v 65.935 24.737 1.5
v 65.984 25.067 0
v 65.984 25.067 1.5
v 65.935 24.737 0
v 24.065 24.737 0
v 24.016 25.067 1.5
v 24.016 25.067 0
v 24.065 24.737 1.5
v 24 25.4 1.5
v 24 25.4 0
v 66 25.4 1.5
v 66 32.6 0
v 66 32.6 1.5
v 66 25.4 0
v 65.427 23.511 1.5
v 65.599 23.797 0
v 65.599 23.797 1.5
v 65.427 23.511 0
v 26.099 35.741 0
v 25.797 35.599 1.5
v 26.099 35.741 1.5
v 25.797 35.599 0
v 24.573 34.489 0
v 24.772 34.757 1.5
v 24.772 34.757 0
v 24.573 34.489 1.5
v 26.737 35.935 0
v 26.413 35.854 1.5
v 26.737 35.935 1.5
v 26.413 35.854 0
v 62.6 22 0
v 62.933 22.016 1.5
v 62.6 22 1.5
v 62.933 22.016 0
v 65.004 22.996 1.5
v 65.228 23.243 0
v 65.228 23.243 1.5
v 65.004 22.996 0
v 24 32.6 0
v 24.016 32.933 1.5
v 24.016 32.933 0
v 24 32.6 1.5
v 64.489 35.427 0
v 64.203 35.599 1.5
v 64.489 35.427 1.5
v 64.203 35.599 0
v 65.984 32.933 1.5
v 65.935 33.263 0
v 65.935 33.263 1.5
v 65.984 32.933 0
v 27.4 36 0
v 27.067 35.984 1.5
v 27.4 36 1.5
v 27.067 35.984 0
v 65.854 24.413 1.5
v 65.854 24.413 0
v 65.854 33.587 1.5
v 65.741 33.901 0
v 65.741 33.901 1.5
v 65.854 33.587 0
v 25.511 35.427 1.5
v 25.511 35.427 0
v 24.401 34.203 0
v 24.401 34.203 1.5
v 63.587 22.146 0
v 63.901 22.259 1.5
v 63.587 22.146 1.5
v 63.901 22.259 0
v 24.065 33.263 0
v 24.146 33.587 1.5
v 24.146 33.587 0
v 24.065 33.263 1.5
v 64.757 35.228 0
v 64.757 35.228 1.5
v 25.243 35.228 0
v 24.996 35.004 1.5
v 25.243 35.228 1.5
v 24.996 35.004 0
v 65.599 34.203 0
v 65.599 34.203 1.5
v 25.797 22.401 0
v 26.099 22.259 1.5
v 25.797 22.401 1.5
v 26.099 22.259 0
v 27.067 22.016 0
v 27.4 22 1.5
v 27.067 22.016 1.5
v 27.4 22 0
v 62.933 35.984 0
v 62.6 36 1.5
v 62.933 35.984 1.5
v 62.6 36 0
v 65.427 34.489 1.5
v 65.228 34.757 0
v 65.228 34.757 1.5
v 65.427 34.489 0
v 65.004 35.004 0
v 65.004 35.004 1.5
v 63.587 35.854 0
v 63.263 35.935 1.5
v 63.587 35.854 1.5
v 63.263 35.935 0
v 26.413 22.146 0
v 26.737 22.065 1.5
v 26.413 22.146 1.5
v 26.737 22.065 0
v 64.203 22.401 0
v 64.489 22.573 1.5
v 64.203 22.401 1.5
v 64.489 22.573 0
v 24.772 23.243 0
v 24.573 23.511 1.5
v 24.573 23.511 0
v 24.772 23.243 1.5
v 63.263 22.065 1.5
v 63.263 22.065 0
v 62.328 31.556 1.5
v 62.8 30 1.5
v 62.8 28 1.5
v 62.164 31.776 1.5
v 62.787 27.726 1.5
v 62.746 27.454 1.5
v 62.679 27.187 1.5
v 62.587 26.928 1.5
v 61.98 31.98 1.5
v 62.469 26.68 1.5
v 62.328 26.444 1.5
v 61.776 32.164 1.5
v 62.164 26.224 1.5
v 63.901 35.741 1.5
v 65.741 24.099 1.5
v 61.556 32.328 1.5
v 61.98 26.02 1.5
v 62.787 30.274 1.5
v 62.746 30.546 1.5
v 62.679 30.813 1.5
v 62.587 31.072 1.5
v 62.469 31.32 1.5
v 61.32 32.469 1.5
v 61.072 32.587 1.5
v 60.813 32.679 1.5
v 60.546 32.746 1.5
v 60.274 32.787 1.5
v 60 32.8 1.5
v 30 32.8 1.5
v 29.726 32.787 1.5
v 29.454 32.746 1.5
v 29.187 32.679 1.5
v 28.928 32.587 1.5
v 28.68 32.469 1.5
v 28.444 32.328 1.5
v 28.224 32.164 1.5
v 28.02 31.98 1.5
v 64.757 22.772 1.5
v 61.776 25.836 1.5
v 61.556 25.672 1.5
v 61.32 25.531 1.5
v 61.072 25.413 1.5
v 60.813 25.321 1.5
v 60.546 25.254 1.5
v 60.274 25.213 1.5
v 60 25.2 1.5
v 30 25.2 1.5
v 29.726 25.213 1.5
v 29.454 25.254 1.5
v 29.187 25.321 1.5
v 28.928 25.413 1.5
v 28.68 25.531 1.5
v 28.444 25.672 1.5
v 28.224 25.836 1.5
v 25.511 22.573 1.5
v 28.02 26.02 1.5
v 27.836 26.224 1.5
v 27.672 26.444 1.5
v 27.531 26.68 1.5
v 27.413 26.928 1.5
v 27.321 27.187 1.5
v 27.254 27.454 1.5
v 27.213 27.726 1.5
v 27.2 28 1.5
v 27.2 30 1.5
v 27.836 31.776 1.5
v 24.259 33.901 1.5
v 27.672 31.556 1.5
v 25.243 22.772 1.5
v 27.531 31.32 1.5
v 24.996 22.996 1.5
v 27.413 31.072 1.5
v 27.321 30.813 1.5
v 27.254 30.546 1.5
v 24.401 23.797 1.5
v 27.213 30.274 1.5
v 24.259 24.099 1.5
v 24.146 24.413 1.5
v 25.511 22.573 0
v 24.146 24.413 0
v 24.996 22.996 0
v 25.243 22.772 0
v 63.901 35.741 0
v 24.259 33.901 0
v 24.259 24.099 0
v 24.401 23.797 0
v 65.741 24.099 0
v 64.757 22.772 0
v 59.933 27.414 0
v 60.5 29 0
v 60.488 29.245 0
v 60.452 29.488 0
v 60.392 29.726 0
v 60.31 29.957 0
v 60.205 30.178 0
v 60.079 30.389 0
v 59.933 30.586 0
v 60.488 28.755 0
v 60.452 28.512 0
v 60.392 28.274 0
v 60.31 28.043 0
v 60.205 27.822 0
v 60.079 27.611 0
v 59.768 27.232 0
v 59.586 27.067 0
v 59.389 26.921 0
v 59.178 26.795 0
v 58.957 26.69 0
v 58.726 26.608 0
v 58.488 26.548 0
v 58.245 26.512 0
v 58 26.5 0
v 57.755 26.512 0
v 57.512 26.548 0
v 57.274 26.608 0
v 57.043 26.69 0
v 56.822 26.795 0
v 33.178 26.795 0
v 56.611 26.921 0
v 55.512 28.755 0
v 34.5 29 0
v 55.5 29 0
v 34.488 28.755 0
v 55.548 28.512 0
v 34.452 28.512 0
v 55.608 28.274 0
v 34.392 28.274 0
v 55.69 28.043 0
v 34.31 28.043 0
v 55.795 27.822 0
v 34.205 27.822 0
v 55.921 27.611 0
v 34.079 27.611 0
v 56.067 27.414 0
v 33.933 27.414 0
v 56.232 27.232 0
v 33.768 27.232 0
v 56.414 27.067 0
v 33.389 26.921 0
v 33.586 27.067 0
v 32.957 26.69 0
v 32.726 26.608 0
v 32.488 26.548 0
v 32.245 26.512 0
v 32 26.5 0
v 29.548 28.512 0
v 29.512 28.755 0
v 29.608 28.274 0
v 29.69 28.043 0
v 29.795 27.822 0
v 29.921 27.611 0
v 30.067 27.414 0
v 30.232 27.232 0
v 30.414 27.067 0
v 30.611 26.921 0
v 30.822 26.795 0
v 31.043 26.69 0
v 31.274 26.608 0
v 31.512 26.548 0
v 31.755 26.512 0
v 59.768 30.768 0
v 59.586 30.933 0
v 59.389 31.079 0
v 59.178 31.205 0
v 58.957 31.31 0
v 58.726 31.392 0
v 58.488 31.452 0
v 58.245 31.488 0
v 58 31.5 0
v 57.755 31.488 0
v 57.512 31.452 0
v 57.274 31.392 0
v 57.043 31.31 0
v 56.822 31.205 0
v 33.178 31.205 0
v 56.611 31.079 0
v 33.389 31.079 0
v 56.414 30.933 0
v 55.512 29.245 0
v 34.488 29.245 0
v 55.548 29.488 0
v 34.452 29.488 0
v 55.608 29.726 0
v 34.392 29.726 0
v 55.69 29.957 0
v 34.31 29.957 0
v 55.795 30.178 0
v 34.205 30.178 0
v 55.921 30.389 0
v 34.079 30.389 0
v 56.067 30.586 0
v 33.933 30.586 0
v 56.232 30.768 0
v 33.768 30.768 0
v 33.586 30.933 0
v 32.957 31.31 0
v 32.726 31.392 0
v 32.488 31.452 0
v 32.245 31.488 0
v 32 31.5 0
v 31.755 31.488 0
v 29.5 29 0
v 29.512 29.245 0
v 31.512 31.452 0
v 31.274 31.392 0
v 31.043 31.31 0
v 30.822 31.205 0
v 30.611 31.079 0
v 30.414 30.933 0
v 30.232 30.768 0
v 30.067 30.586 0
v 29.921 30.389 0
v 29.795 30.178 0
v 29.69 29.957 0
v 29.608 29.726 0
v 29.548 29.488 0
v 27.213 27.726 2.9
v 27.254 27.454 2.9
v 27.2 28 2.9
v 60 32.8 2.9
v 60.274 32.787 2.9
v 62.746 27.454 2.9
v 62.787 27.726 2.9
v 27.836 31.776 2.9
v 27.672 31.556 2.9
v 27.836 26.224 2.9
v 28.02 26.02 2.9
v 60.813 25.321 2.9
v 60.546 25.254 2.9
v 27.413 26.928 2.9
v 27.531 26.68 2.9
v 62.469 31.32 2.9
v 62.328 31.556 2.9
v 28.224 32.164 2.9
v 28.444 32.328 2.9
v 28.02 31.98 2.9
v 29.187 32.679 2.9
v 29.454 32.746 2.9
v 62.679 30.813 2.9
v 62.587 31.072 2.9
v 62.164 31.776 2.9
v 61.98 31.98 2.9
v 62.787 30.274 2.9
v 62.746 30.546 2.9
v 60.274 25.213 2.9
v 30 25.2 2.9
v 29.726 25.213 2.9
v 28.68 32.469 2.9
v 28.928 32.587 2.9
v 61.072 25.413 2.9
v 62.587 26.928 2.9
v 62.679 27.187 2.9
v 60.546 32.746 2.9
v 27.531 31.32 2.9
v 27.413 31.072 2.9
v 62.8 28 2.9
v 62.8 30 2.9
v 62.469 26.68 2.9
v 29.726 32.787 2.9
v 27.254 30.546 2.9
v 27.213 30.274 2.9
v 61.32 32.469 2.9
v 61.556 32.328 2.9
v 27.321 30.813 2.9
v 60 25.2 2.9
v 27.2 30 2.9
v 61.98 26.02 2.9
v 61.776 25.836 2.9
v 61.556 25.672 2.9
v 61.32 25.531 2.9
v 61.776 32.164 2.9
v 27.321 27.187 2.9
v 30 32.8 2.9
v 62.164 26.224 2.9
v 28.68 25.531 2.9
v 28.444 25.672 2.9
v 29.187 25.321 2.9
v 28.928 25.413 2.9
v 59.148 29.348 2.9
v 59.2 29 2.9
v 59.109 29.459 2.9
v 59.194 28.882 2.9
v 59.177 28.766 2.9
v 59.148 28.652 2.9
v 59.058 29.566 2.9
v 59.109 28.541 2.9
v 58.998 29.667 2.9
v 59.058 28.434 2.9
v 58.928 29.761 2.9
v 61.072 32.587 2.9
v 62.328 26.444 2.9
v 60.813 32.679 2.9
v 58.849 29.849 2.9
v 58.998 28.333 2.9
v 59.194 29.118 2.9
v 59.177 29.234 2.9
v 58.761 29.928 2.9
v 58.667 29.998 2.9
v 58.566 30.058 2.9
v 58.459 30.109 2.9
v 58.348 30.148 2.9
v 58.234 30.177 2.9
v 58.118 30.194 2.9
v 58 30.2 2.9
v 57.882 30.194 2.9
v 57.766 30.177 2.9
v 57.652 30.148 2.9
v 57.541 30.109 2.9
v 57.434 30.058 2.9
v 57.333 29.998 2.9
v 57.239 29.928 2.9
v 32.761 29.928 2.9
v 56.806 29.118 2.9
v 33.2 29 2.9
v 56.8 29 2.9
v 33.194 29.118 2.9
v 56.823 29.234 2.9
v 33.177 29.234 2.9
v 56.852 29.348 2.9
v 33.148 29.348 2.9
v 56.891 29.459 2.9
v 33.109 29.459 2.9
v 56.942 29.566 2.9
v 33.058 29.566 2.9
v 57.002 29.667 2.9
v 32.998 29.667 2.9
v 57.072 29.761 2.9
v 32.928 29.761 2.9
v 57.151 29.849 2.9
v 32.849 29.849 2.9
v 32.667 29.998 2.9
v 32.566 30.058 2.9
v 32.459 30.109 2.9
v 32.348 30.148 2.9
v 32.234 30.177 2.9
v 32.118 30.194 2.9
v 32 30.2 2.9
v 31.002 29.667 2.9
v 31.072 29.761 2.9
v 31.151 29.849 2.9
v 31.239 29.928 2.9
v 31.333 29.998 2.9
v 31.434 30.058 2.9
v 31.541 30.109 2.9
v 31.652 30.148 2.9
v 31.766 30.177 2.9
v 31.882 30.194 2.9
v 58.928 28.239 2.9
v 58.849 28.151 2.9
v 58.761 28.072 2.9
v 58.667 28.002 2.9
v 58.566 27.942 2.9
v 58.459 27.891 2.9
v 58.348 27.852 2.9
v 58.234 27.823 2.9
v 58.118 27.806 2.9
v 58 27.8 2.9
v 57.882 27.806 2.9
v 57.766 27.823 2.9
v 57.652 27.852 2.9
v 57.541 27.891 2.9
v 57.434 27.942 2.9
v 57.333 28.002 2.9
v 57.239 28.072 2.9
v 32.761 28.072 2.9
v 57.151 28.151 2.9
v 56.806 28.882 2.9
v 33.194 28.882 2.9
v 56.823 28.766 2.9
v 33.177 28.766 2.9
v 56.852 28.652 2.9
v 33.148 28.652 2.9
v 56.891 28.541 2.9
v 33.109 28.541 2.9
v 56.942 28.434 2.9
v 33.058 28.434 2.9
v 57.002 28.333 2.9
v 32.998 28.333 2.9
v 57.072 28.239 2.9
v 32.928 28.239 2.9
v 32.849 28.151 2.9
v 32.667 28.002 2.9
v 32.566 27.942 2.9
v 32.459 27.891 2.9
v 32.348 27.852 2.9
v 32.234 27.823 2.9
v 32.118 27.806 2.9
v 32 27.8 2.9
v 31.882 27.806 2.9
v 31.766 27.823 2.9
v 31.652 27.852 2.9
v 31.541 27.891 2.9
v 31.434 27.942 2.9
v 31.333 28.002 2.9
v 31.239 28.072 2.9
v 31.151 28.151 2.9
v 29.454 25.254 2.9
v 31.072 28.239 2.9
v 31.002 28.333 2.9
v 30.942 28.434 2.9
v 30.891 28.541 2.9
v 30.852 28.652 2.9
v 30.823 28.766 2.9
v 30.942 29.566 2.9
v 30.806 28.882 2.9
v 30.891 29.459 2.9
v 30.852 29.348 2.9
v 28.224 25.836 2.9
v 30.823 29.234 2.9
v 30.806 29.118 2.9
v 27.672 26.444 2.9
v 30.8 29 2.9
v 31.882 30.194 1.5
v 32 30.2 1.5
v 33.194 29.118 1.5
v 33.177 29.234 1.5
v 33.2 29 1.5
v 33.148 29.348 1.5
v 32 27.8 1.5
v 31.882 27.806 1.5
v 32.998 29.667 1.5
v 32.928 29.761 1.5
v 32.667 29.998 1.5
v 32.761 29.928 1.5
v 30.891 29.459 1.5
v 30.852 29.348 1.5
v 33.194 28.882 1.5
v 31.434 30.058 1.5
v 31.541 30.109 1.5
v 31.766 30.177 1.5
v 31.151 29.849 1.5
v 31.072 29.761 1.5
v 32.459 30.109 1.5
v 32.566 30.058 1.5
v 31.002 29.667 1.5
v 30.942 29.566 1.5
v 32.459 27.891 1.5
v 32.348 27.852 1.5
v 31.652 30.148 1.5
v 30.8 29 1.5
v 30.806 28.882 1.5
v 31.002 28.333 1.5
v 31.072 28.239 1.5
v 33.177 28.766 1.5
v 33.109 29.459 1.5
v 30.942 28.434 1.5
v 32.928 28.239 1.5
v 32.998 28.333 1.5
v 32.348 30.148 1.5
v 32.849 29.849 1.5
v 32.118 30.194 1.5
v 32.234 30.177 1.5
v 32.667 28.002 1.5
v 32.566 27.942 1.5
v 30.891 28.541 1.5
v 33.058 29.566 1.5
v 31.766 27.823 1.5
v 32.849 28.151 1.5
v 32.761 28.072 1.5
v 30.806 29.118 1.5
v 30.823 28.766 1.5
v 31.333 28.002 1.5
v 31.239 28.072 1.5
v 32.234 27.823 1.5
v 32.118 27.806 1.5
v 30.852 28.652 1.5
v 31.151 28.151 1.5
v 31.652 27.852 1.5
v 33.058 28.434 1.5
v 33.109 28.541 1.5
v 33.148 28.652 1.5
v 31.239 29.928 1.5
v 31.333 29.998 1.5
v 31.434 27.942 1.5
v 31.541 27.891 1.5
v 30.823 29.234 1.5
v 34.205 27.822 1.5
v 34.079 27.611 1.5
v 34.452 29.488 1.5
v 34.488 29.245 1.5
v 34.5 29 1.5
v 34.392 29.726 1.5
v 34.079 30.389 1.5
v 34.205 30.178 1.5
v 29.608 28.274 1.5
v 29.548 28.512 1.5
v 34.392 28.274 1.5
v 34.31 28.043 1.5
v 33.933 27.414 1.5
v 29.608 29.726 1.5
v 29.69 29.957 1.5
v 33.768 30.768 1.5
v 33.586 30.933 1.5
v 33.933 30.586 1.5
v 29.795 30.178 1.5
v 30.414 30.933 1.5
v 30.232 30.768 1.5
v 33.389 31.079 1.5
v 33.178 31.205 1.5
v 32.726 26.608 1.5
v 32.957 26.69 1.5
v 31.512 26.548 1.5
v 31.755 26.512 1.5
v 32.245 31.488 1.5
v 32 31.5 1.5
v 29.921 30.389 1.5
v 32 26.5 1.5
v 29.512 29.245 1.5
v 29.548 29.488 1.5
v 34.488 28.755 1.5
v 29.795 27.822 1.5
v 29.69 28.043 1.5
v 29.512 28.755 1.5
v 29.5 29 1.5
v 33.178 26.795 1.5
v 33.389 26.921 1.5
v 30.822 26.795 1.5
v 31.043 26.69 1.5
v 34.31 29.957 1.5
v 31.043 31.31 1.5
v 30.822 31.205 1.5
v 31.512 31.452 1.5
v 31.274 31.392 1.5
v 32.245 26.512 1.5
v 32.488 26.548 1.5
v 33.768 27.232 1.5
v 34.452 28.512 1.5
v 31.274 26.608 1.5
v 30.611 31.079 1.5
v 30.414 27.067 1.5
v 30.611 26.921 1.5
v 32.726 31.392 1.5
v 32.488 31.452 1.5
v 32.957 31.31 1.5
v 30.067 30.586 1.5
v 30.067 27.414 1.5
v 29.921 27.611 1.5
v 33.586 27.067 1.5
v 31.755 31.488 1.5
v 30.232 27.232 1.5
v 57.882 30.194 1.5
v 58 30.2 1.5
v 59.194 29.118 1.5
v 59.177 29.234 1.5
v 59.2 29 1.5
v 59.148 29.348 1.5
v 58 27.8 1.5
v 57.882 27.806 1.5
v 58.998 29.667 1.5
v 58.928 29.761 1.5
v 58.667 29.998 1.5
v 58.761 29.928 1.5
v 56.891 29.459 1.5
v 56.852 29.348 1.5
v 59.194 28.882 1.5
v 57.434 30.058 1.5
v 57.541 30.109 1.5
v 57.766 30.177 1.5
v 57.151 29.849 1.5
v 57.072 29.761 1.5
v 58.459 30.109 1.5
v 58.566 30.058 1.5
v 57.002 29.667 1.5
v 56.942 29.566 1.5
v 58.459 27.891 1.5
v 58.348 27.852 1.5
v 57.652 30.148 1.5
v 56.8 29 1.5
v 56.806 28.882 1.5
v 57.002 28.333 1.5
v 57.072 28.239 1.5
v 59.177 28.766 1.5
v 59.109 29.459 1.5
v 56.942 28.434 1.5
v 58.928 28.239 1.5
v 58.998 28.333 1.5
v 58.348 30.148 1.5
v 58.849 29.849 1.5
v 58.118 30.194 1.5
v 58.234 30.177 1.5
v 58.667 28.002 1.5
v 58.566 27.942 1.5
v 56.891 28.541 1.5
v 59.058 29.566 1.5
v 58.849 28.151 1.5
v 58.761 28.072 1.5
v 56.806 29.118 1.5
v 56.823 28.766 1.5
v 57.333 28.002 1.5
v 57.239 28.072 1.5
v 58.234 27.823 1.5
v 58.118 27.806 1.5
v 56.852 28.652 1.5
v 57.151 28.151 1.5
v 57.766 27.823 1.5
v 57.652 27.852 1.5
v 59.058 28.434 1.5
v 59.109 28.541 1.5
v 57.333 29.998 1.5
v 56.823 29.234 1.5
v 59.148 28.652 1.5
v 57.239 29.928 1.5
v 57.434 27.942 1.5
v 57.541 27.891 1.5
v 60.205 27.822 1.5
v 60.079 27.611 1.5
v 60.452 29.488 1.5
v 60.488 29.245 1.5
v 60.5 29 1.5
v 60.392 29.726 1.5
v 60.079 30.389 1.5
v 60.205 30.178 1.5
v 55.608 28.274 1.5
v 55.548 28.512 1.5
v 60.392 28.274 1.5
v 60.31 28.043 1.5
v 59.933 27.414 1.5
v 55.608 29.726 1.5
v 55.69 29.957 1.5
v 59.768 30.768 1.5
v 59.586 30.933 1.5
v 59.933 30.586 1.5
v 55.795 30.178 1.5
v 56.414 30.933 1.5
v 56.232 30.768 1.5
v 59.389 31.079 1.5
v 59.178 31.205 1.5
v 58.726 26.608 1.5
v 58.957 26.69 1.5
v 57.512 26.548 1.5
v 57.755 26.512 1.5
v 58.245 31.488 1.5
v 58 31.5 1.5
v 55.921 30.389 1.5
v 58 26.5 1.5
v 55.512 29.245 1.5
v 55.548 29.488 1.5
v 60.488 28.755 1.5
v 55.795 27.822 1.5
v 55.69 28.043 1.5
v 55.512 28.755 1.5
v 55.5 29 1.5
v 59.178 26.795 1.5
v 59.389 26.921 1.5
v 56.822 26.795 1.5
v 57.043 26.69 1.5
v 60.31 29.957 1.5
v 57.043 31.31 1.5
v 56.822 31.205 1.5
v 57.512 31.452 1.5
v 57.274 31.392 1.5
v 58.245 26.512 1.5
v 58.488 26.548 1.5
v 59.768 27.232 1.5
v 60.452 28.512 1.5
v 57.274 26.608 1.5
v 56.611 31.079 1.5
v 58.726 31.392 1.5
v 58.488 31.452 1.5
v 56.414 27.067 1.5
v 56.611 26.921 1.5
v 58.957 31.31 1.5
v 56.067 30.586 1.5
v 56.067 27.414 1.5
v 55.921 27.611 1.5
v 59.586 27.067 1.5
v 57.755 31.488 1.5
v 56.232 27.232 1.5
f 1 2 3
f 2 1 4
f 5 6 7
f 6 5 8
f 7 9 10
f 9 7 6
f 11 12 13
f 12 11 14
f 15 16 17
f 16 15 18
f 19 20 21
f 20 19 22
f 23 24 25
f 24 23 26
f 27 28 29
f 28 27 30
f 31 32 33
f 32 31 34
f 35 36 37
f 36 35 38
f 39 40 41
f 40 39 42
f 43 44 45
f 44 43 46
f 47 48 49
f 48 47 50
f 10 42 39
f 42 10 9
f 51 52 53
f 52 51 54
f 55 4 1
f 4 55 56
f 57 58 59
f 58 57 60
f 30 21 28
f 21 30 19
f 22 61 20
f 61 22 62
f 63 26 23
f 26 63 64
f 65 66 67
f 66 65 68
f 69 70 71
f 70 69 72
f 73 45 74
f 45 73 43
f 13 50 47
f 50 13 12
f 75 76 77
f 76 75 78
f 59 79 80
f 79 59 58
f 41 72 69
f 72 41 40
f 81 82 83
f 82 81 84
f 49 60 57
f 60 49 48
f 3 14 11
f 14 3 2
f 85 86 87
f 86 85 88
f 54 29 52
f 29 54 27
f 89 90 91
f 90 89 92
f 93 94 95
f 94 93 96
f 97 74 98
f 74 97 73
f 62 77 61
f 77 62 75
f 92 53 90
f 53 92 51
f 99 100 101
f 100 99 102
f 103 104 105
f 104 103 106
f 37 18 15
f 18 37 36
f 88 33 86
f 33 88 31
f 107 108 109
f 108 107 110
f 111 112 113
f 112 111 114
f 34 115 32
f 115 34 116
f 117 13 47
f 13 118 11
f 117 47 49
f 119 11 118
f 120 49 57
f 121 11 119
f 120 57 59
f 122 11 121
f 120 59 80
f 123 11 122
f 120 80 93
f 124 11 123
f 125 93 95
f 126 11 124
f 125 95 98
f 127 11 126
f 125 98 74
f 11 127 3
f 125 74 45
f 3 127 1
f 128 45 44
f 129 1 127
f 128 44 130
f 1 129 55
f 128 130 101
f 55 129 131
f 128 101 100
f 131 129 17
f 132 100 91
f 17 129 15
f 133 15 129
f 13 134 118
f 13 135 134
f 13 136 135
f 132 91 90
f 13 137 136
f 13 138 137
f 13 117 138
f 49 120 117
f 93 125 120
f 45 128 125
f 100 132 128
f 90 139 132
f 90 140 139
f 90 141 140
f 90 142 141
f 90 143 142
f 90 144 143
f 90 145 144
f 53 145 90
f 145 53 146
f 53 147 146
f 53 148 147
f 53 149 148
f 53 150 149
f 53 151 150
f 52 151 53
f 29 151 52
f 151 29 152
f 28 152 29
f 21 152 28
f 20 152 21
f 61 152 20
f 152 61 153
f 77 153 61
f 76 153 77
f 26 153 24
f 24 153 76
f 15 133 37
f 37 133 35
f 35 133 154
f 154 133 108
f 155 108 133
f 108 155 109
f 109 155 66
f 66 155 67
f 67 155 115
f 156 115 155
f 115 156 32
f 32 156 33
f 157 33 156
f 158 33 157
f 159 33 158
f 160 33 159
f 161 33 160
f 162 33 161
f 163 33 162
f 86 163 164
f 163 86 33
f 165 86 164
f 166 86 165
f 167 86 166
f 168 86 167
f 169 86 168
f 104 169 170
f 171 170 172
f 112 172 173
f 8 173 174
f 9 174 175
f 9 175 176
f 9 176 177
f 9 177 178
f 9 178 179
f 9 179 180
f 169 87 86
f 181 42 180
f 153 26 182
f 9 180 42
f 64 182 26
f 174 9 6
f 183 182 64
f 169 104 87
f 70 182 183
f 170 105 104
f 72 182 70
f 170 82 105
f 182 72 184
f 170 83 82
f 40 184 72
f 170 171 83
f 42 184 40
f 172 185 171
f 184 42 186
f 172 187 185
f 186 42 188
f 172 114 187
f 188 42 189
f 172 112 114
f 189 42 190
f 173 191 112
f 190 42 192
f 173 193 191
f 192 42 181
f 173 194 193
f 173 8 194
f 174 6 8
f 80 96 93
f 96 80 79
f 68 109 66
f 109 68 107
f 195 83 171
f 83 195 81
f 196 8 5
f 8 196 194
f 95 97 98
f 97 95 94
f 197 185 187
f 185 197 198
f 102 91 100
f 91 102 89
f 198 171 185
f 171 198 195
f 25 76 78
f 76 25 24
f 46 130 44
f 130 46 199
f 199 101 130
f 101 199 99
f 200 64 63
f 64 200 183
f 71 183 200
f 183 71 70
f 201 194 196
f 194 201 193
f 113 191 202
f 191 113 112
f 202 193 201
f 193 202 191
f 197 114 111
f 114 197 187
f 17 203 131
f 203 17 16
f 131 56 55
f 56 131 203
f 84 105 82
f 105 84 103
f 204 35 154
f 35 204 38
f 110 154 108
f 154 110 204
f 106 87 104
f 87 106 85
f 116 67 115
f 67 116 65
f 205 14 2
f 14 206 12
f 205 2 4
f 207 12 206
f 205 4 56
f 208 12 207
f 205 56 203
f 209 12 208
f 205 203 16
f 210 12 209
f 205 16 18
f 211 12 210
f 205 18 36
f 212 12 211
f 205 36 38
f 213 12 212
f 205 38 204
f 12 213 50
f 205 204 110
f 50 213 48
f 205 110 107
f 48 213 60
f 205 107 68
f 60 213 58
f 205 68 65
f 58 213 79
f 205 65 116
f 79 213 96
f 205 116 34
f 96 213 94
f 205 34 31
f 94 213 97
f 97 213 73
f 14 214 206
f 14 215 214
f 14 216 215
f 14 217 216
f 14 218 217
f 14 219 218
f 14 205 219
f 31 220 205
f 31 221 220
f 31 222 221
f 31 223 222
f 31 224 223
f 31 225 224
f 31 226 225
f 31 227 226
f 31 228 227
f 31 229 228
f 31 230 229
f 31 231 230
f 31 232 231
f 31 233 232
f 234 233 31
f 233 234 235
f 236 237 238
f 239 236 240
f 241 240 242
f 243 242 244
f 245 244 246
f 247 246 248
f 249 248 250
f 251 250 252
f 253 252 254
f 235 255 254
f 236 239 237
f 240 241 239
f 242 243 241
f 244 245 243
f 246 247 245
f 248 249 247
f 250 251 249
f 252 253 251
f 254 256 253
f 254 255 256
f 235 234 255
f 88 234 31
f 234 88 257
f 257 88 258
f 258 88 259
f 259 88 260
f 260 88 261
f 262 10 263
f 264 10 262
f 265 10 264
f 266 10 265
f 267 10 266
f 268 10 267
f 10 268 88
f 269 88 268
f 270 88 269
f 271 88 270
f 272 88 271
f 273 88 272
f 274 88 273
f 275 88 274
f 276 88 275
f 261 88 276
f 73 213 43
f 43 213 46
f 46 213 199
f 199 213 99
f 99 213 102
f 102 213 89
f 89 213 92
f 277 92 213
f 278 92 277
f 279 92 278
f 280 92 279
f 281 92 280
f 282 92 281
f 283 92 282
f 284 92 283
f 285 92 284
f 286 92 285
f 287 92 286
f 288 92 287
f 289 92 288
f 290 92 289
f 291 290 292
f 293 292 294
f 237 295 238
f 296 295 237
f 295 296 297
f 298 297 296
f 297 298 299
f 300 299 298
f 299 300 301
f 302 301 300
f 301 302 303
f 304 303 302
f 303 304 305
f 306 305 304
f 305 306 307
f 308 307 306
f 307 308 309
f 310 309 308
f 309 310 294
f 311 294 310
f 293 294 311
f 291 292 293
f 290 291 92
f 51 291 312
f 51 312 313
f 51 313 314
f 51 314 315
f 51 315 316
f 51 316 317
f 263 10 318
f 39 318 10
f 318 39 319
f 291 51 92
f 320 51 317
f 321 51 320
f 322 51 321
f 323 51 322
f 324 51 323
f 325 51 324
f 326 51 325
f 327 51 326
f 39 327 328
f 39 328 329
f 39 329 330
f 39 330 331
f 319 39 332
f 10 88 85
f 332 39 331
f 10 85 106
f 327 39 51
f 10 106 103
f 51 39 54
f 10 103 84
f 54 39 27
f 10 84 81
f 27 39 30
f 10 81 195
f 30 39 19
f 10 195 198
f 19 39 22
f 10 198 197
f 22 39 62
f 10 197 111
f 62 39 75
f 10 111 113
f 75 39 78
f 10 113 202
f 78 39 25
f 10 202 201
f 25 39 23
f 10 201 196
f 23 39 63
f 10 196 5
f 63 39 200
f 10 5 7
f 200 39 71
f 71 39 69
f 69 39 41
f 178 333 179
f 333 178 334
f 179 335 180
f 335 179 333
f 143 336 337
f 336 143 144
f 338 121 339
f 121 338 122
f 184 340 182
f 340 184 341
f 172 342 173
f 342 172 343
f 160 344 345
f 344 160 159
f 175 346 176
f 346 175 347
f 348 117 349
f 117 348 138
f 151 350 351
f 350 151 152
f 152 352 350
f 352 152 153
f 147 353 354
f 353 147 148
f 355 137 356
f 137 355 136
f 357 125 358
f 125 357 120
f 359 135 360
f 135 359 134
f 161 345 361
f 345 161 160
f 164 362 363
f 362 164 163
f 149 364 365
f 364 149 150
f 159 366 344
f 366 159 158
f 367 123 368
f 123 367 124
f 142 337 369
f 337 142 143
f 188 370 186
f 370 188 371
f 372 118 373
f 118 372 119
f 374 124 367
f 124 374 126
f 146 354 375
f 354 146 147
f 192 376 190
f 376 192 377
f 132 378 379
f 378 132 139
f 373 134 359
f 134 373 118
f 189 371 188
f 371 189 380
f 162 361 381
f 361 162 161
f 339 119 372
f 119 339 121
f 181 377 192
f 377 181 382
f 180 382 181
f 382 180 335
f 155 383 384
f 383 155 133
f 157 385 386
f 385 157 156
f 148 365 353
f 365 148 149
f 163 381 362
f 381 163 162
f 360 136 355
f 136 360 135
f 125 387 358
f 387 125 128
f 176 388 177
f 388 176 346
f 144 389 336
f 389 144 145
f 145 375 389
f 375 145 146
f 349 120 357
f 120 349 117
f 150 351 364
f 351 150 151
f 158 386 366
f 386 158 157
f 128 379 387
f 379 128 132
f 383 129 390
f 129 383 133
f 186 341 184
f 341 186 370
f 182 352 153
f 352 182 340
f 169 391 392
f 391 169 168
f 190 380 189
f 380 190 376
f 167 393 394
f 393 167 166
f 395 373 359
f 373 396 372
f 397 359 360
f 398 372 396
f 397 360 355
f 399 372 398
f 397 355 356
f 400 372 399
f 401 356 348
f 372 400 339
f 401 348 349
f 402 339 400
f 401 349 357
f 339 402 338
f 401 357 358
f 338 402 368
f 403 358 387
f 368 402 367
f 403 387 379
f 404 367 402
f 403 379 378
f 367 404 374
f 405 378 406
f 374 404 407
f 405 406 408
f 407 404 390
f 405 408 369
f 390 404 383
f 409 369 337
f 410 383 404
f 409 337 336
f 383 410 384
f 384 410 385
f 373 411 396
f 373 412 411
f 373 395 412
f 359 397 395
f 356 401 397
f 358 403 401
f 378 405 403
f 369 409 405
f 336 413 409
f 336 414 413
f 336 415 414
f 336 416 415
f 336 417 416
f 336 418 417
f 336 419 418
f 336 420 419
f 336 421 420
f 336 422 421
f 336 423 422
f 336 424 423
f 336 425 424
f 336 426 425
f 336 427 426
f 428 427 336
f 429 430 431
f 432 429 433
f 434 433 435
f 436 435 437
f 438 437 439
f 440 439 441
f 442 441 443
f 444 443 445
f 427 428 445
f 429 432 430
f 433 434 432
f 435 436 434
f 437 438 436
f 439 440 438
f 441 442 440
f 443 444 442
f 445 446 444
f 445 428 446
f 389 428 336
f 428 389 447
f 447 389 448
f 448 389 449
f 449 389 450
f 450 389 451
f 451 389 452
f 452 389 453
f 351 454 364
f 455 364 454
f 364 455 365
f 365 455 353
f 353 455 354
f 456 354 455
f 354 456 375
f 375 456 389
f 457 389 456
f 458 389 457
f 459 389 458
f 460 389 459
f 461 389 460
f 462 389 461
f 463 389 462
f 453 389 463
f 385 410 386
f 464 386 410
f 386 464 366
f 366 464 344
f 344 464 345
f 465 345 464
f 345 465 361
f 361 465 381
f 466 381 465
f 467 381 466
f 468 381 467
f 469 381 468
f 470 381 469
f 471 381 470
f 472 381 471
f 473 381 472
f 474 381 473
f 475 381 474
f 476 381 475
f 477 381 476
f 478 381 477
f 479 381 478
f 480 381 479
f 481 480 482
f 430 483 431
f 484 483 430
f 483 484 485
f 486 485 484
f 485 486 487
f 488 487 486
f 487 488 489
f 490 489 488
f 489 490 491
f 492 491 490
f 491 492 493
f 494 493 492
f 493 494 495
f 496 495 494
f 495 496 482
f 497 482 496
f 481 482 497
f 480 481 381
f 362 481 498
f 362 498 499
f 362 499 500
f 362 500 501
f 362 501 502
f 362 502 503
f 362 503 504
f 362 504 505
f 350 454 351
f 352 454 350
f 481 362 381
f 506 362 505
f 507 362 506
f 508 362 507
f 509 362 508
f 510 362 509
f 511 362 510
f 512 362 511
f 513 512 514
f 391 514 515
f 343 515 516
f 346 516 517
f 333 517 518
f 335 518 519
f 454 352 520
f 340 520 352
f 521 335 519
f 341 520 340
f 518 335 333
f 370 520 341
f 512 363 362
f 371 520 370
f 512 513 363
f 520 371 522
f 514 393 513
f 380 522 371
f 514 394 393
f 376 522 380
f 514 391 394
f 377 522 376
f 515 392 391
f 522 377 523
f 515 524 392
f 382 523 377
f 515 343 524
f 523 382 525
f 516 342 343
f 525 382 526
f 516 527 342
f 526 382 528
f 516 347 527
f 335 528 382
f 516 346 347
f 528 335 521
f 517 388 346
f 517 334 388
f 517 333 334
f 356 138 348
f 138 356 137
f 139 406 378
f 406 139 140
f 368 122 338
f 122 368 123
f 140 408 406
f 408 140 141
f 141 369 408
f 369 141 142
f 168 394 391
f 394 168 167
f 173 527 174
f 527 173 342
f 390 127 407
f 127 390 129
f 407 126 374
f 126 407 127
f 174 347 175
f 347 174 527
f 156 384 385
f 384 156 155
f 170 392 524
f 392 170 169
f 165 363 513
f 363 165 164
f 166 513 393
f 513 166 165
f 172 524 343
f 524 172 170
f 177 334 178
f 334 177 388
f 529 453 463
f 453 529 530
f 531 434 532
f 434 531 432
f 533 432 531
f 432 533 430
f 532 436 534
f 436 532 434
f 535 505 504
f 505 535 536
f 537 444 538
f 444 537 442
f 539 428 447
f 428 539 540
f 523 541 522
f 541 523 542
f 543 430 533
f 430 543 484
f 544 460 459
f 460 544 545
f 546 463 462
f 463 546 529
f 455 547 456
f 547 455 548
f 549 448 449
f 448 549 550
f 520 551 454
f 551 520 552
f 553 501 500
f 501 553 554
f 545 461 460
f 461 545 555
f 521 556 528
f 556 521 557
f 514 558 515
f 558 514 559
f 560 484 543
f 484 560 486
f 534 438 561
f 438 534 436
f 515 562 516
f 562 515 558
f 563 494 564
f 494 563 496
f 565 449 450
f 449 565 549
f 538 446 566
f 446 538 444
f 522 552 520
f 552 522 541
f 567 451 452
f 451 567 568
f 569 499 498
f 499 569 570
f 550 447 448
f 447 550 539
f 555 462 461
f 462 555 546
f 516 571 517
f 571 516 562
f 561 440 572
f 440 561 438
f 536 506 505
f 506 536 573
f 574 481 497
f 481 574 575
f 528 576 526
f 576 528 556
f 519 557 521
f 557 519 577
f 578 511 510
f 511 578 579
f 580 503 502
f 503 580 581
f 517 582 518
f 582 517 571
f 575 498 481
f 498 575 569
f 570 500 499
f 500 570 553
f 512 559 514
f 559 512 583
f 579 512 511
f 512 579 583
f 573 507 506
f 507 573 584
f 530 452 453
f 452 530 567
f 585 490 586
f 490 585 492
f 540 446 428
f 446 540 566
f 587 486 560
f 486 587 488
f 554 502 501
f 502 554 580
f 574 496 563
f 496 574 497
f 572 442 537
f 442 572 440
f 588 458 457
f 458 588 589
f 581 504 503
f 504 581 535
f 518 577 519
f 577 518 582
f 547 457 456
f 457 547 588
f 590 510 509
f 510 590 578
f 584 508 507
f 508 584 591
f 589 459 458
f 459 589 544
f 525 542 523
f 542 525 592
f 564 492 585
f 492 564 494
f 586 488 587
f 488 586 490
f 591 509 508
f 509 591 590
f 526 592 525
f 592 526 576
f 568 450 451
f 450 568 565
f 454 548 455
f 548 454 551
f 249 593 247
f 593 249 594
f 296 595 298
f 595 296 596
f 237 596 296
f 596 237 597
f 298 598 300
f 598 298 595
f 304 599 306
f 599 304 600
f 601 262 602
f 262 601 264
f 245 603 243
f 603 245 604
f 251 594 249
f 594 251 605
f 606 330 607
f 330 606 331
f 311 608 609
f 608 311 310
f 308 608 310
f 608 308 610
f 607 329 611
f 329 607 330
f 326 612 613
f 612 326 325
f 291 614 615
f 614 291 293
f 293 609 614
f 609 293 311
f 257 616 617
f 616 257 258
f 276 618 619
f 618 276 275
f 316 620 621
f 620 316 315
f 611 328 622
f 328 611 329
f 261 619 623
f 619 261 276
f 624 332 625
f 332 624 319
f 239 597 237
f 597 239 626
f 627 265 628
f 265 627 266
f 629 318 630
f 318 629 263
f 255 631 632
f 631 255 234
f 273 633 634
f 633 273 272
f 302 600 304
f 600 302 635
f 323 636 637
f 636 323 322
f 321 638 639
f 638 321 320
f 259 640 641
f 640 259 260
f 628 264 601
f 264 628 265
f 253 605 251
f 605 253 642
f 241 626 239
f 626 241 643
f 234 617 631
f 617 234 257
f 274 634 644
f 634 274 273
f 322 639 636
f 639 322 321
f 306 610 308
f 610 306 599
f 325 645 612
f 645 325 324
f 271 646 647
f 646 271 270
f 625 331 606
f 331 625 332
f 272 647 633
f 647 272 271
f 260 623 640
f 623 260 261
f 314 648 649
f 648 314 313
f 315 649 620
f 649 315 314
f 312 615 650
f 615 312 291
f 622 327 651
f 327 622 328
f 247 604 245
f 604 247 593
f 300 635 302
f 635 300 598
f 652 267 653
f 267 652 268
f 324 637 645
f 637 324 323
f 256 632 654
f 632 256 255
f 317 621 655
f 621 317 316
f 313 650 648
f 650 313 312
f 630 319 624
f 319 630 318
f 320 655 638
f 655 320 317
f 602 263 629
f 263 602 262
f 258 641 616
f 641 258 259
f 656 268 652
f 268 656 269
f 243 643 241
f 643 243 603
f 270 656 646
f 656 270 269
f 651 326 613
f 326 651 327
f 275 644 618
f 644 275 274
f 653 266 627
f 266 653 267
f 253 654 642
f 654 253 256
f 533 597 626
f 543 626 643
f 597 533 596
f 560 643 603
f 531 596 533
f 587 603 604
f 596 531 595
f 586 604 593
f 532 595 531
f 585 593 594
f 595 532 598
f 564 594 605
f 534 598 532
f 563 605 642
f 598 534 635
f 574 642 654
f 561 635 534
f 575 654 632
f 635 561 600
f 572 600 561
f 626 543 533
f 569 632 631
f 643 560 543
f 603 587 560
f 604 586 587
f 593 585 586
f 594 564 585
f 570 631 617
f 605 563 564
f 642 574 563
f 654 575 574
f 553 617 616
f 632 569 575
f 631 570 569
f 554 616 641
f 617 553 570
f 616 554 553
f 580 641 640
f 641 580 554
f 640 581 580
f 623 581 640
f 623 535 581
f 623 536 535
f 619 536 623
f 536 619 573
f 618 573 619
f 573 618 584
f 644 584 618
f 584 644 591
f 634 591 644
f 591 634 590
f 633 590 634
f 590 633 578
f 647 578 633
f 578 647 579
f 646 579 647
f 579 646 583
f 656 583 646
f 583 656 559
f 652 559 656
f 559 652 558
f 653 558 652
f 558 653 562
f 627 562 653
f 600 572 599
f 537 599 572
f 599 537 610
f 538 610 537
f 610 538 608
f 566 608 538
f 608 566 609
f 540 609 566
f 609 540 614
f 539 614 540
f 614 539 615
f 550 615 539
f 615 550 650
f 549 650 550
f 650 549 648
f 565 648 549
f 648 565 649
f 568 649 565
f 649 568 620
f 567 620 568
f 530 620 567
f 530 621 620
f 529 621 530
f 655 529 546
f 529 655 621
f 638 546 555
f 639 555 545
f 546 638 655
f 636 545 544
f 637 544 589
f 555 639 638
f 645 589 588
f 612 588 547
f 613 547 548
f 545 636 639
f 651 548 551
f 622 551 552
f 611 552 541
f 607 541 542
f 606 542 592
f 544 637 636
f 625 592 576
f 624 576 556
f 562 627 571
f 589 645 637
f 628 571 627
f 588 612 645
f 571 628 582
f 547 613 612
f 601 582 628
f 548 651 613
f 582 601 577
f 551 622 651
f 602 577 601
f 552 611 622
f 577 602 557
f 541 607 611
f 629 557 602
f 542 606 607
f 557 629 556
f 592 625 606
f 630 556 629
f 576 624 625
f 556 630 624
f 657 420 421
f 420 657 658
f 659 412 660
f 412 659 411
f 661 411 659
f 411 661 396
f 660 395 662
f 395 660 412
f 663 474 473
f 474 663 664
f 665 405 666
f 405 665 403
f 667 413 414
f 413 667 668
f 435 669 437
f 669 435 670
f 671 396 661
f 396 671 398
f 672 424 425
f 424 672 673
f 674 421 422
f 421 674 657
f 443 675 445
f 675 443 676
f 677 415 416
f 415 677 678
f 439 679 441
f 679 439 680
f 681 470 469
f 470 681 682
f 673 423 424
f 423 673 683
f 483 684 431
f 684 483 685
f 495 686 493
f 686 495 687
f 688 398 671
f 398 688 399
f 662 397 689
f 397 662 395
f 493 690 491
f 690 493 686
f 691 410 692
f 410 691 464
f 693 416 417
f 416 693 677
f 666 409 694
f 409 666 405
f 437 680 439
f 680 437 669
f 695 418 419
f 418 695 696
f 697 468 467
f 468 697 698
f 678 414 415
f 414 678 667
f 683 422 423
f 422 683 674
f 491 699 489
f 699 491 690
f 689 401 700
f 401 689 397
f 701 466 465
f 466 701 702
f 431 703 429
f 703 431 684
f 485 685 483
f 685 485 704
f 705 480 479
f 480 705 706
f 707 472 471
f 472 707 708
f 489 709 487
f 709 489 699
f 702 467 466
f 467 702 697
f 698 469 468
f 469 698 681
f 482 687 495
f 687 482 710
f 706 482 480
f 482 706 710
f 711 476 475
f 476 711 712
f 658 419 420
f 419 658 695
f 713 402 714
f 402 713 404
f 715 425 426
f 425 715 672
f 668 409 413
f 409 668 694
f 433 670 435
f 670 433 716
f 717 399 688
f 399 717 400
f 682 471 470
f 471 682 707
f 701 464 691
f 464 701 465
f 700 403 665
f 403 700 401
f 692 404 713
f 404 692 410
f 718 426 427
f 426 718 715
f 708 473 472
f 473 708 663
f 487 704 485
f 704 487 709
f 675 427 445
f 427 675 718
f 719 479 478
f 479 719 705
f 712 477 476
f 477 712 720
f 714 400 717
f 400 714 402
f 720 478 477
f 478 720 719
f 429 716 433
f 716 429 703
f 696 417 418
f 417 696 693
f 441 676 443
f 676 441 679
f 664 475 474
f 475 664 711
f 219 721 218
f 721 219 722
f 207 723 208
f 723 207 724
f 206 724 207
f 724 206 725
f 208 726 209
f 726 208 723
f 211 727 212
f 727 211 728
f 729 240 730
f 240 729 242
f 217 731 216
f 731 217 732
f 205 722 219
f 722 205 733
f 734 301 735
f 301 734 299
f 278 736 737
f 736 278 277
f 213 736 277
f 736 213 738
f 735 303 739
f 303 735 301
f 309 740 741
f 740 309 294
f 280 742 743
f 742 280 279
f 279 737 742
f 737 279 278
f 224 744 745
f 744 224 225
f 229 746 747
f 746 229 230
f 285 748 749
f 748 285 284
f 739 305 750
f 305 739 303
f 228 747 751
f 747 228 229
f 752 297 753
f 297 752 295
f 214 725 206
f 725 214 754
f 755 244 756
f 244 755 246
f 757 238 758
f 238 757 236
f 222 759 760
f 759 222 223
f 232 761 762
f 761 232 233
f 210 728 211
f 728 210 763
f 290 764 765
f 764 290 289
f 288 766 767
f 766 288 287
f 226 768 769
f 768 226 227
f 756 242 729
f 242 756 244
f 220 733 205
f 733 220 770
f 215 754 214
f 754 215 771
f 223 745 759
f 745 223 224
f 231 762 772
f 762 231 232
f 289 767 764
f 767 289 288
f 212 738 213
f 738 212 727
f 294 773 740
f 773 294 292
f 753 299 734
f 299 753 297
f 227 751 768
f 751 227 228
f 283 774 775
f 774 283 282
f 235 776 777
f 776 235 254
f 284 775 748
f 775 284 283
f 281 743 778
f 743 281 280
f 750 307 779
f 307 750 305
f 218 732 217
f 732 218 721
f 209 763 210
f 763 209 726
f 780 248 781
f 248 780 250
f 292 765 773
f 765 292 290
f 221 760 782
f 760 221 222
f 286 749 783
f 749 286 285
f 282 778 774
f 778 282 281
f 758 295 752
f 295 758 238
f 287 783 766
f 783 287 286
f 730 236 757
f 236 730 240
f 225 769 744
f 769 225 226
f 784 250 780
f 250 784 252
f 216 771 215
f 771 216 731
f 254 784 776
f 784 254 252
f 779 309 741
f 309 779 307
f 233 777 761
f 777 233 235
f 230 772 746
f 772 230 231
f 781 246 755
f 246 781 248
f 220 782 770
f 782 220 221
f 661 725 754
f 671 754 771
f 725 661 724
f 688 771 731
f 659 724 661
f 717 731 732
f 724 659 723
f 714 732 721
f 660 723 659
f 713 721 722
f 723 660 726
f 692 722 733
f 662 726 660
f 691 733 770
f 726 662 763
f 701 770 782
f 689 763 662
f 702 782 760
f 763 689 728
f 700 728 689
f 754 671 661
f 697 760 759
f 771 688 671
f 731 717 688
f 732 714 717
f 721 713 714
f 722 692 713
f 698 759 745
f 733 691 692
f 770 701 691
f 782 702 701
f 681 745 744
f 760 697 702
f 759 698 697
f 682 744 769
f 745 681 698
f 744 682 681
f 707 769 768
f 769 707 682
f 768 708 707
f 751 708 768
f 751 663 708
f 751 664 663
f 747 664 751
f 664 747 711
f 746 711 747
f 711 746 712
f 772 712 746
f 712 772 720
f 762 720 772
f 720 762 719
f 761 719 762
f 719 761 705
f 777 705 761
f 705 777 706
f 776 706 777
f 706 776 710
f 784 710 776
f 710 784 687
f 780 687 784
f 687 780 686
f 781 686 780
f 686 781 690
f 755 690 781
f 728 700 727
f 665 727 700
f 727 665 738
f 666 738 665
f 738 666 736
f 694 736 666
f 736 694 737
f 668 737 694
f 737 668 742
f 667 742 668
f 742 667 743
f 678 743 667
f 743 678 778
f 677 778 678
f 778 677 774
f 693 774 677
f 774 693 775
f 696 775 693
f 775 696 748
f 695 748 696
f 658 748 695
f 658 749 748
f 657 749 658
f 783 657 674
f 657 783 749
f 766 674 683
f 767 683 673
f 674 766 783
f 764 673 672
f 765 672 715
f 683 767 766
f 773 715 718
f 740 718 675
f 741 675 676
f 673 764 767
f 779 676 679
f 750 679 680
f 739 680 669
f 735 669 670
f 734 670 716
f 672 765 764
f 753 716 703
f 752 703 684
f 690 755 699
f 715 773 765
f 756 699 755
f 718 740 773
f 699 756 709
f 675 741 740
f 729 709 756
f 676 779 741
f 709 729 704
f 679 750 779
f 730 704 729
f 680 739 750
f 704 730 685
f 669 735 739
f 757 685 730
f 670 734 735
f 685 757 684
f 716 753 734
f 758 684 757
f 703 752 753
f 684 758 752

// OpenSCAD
/*
 * Compatibility entrypoint for legacy automation.
 * Maps the historical BOTTOM_COVER export to the new SERVICE_DOOR part.
 */

part_to_render_override = "BOTTOM_COVER";
include <enclosure.scad>;
